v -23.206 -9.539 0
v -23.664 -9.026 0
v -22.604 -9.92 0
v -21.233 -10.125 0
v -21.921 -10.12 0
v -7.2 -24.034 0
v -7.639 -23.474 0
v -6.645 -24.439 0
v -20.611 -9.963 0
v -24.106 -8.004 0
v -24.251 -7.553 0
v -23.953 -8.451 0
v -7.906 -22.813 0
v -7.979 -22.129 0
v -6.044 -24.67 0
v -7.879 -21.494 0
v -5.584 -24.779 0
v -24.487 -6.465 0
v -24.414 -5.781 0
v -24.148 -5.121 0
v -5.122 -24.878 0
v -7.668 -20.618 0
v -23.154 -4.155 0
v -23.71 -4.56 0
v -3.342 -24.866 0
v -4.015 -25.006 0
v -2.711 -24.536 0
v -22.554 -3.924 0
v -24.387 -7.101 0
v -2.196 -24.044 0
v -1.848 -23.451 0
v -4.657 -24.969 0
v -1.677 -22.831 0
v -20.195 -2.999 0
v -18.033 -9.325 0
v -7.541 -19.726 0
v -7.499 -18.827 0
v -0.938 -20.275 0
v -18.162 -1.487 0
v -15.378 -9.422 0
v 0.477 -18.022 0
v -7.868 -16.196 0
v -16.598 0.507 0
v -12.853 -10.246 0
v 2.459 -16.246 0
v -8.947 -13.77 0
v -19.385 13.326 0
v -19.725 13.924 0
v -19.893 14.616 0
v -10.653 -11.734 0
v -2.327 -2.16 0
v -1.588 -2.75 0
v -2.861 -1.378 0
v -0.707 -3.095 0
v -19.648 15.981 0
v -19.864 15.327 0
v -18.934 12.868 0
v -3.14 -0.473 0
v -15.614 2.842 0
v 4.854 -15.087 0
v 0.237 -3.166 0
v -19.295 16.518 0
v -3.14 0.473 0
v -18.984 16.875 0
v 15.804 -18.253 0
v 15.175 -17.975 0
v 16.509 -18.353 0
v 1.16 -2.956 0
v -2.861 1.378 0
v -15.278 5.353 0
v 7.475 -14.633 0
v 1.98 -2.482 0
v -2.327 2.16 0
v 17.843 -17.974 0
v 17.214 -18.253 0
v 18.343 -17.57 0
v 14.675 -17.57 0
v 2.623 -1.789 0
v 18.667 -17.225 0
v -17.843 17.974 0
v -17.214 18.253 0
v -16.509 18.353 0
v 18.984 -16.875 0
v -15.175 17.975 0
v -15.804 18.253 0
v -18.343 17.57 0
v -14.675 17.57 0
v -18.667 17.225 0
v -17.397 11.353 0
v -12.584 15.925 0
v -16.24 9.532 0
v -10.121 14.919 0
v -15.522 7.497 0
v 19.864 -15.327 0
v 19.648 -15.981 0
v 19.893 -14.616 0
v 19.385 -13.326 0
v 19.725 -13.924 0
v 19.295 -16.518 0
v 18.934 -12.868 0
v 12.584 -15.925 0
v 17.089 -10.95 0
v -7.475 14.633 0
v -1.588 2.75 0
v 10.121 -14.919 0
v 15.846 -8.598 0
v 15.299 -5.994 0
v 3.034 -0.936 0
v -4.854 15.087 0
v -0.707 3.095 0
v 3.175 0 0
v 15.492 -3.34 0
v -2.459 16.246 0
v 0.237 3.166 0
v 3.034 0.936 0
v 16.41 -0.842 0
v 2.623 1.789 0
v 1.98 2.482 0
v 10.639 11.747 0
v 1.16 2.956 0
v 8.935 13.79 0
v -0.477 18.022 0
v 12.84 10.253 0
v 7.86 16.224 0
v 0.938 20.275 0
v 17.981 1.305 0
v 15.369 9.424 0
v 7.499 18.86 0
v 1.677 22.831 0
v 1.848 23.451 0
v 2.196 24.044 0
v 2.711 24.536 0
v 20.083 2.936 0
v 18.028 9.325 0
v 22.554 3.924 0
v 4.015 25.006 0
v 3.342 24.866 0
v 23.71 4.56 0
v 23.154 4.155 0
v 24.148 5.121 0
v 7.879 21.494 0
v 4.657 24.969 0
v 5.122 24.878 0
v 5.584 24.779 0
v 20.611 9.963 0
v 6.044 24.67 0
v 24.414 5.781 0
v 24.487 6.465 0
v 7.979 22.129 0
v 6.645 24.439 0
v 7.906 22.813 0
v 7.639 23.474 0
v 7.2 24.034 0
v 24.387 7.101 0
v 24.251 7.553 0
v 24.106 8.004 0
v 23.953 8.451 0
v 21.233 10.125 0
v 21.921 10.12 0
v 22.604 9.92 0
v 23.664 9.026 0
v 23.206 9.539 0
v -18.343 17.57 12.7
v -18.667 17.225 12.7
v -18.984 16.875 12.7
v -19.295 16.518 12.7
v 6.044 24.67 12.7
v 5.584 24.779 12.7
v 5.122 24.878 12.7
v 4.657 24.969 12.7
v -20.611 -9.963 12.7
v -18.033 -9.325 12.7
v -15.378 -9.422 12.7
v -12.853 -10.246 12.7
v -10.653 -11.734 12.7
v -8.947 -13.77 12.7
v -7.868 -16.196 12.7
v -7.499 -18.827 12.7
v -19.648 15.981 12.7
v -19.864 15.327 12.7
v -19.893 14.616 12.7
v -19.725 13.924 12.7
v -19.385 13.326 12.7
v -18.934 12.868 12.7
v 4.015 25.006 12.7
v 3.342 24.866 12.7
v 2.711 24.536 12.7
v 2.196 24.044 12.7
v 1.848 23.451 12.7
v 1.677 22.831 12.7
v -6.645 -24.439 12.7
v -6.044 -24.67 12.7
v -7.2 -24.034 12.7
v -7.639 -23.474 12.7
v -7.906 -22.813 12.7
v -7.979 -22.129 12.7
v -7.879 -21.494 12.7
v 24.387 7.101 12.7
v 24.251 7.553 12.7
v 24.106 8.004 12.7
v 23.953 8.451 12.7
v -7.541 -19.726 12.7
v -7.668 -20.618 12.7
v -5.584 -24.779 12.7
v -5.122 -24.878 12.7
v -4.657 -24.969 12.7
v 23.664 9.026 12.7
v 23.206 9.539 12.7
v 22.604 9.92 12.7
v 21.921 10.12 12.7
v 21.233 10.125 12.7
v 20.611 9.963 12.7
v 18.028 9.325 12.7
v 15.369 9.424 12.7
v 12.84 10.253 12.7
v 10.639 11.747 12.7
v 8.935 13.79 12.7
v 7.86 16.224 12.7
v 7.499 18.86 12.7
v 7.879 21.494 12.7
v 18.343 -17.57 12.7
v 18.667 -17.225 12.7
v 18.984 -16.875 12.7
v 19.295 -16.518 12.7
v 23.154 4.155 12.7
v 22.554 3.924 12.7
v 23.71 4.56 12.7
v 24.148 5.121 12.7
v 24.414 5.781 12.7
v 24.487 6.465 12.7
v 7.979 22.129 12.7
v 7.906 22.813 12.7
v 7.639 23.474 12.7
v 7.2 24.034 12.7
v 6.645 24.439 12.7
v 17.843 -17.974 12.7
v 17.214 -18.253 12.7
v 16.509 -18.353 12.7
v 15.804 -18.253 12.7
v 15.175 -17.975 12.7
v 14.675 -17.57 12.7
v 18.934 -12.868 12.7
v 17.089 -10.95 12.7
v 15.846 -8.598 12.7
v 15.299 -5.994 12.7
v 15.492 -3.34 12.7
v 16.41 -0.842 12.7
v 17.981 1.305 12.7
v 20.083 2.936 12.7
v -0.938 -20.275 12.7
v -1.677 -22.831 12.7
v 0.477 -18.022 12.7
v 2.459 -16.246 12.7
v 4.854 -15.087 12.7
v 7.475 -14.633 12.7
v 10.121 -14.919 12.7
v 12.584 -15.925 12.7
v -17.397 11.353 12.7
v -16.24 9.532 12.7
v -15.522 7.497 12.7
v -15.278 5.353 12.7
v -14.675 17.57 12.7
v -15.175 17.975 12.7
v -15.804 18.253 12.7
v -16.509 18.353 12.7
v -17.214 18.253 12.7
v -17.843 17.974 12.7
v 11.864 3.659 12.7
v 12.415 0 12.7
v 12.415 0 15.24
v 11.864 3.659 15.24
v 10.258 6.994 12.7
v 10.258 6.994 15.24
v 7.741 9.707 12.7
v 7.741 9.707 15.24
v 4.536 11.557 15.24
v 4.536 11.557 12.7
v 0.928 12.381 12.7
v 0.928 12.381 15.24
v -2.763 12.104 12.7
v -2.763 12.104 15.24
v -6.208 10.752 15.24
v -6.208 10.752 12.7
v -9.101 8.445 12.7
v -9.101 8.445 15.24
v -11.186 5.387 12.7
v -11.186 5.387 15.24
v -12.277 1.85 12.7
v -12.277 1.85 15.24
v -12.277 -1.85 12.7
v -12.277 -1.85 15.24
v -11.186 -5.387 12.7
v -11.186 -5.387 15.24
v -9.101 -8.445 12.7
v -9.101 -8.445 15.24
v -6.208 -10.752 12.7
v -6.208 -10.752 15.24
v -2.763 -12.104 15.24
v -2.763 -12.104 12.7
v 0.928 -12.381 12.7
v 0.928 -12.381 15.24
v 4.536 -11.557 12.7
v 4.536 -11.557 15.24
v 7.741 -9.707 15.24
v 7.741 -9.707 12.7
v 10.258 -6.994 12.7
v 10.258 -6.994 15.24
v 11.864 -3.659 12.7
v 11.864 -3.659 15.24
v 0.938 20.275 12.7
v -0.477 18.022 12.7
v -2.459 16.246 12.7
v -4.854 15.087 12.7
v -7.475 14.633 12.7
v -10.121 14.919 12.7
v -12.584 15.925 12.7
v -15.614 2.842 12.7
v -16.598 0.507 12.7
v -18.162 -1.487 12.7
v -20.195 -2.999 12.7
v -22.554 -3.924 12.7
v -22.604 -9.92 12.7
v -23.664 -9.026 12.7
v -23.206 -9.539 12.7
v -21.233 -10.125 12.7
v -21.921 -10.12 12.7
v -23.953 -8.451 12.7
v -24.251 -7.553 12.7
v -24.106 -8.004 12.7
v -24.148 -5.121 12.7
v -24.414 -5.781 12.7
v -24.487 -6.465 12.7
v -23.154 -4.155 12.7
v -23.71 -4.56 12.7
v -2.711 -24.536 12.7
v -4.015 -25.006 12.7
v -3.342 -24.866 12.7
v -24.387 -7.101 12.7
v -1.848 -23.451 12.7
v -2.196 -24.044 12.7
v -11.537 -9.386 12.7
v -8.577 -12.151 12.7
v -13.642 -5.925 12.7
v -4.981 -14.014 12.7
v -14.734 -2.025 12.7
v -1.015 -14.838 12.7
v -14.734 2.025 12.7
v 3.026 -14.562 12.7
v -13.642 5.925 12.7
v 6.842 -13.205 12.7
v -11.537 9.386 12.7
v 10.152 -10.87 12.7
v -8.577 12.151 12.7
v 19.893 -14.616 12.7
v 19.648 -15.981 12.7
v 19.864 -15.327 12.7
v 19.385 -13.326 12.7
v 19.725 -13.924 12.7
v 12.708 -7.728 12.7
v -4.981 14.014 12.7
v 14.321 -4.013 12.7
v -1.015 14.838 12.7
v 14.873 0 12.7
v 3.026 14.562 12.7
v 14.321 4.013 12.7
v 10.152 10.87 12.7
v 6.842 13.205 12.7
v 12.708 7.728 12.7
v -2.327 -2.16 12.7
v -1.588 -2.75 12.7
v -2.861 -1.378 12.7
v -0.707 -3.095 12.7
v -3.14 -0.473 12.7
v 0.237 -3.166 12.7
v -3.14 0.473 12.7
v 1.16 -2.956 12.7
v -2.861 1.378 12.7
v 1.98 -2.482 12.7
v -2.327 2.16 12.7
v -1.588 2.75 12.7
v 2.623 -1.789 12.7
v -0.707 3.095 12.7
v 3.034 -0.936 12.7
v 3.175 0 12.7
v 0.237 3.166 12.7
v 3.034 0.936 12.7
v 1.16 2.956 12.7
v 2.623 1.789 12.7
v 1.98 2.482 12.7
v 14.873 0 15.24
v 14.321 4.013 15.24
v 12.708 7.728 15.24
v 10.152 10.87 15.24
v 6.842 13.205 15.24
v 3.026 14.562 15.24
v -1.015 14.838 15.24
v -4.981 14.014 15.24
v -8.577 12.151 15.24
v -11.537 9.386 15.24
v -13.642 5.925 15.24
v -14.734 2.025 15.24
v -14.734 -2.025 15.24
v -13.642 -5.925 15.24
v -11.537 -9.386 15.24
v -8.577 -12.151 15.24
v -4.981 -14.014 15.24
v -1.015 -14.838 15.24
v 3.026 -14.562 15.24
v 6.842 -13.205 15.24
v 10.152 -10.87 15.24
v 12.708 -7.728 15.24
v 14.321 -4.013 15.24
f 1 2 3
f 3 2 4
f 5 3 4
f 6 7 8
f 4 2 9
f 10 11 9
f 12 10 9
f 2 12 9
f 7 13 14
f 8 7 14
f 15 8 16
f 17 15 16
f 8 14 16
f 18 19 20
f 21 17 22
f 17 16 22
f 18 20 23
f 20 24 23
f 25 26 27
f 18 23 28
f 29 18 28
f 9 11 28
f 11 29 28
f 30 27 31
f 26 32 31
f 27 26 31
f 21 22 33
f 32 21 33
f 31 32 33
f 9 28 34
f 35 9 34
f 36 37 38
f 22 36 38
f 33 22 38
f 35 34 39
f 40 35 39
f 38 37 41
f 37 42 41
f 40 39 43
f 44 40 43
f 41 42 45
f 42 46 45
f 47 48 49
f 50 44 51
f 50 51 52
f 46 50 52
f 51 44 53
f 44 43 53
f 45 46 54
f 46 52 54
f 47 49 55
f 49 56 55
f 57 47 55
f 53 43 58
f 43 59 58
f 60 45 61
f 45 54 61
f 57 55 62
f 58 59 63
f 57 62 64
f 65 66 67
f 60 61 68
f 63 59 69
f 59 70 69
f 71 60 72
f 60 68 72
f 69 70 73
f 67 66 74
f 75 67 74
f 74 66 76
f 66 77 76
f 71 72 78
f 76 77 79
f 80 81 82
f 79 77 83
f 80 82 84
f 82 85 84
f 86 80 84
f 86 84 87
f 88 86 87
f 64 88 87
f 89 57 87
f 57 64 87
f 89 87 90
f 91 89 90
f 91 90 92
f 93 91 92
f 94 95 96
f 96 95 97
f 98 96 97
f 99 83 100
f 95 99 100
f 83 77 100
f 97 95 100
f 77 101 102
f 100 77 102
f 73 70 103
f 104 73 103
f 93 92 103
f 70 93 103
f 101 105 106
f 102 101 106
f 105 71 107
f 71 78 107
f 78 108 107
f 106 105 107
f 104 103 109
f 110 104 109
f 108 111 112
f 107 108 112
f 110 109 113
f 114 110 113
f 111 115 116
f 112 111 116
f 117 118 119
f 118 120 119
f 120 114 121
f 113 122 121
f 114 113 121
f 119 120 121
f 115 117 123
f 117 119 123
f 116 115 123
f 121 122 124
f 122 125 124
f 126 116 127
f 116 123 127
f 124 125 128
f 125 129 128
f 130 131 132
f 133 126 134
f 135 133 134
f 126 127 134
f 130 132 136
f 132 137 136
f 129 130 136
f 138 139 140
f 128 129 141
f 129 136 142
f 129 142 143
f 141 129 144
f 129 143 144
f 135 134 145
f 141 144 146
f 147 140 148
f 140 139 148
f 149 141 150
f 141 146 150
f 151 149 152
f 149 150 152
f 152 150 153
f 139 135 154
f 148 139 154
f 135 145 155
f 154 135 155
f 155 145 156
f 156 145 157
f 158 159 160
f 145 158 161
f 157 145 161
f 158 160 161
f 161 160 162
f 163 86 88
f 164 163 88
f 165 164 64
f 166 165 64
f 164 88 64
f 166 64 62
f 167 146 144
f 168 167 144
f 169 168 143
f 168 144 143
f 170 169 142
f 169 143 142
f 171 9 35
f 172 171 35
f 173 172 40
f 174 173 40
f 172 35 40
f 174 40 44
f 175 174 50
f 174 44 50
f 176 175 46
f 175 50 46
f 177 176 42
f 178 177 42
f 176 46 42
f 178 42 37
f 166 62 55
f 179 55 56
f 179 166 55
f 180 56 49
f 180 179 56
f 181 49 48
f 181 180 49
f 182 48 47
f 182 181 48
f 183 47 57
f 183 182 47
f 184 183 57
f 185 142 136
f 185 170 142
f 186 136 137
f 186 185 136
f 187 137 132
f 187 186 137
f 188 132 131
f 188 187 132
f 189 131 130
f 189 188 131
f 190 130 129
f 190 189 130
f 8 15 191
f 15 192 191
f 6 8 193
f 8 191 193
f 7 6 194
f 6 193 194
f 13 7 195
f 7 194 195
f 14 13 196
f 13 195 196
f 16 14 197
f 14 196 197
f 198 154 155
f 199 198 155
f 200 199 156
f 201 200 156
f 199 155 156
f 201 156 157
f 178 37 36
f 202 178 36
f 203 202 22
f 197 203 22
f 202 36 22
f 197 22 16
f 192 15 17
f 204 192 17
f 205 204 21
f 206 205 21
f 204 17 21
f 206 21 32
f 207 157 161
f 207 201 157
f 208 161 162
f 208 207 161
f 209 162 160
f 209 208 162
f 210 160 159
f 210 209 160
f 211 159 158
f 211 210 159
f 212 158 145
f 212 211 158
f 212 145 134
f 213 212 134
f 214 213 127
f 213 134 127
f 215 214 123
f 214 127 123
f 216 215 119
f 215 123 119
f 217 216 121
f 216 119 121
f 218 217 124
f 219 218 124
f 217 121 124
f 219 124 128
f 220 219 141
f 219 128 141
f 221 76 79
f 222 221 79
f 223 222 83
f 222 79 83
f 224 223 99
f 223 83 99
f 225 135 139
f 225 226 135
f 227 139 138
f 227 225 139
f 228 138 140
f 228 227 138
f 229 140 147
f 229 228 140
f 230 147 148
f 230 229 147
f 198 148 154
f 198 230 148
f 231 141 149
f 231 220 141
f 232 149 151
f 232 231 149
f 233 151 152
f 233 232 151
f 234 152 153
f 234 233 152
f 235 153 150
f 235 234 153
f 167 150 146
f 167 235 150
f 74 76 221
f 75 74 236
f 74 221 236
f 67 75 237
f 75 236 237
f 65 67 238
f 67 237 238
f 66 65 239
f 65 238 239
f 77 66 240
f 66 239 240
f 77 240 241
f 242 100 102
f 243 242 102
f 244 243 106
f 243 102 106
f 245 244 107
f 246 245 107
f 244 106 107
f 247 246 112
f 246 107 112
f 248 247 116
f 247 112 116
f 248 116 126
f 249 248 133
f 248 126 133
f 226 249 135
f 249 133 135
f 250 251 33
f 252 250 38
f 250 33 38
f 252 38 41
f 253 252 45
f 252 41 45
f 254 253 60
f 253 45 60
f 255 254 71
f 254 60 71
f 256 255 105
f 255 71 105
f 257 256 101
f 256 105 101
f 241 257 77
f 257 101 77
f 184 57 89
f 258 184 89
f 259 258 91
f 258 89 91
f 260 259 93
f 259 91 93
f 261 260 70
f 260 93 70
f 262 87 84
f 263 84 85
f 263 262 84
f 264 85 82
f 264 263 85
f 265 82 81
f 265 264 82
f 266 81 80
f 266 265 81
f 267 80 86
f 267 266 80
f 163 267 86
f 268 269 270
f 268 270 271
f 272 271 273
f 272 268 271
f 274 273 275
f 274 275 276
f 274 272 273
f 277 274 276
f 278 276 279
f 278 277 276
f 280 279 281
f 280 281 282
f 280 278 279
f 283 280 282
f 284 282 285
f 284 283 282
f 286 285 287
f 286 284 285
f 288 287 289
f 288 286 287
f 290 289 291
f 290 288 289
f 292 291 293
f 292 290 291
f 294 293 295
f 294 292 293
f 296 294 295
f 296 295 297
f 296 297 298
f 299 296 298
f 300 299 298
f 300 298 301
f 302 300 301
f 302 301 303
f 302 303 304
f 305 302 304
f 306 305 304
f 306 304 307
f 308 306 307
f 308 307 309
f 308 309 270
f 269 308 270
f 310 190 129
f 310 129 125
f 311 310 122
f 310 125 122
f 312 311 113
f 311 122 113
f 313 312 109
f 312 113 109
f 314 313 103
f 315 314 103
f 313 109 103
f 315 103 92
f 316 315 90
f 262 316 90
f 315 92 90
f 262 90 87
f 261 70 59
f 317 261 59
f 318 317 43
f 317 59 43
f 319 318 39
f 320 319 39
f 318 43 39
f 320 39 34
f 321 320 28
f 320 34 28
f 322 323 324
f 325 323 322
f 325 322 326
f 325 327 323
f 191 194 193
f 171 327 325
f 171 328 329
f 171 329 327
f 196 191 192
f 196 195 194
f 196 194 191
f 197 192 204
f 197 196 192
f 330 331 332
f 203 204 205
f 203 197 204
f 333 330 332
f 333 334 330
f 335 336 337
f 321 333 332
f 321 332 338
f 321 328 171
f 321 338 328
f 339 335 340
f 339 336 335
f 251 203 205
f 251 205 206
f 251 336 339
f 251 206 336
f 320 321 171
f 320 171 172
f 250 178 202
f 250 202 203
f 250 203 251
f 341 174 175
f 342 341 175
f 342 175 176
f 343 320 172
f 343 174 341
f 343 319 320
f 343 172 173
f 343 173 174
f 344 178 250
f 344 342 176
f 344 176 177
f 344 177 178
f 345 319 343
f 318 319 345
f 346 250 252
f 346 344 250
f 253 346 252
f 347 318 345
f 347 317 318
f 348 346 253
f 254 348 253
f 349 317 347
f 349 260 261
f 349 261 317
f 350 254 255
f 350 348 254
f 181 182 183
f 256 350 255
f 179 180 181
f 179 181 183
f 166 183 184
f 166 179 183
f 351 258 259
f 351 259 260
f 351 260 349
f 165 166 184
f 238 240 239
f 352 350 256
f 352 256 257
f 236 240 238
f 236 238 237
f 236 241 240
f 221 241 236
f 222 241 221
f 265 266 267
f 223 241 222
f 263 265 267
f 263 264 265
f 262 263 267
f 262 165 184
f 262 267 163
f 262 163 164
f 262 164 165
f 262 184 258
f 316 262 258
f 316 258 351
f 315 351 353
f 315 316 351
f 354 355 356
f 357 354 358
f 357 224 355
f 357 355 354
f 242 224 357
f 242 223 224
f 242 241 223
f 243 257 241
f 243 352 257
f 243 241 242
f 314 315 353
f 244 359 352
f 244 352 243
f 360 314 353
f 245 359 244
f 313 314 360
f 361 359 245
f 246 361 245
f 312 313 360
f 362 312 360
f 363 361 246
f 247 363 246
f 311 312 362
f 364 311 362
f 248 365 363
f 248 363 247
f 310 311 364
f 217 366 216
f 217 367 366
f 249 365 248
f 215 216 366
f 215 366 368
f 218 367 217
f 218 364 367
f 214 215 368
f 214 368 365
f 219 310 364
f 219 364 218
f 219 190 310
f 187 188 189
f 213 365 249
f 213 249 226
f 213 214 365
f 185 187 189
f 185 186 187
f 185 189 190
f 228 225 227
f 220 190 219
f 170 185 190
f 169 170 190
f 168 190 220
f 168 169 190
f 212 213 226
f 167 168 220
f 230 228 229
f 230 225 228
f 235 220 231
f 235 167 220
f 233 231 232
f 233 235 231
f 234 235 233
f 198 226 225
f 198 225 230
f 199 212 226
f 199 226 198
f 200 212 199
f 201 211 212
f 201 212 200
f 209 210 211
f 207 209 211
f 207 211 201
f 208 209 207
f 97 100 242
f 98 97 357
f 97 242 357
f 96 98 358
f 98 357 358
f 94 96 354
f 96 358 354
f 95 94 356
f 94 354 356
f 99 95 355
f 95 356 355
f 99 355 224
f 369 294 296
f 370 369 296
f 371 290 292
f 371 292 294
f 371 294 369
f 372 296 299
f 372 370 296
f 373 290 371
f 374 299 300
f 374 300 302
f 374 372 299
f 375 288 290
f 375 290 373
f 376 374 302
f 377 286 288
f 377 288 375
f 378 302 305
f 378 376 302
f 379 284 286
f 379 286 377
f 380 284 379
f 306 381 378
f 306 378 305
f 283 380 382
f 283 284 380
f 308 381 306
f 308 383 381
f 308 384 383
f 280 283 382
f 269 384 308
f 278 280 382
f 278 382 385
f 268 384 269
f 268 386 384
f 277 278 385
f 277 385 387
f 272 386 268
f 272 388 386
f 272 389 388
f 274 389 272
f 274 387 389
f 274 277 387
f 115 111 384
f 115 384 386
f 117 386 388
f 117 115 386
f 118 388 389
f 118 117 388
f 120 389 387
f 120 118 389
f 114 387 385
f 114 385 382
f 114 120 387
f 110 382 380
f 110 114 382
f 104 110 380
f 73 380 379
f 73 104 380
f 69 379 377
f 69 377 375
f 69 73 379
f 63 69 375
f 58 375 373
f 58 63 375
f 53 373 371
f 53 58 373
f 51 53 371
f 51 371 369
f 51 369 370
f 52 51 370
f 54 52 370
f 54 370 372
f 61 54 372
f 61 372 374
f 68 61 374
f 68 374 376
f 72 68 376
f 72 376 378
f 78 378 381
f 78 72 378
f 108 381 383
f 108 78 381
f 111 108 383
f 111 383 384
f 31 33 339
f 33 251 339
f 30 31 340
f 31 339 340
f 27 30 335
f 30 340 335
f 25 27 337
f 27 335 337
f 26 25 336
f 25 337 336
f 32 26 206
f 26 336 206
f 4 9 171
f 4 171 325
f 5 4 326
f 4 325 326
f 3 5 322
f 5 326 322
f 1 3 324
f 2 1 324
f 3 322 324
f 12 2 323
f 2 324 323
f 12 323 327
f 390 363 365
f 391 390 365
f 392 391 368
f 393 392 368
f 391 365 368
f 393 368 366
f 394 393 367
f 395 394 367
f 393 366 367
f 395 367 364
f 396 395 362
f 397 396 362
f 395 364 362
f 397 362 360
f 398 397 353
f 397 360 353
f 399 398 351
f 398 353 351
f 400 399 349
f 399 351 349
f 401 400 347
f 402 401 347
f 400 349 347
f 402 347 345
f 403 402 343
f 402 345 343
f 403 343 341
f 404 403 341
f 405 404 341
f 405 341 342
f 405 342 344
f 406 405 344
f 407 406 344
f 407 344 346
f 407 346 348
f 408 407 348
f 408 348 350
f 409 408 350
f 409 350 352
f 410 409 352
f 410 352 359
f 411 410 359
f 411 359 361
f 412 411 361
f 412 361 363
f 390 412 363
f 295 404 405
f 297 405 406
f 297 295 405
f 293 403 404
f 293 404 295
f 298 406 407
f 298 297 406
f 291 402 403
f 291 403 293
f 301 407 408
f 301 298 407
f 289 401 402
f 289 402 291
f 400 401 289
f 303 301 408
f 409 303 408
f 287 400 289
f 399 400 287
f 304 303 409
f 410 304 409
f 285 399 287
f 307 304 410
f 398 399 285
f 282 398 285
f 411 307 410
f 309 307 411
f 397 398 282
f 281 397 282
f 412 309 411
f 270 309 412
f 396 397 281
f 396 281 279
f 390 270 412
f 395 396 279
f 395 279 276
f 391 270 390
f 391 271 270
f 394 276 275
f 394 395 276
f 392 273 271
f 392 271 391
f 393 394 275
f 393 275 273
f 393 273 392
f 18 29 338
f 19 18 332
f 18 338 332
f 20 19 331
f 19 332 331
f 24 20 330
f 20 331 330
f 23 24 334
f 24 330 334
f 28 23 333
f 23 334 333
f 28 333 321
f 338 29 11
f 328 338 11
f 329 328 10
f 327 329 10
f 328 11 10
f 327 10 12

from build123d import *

# Parameters (mm, degrees)
F0_R     = 14.8728461467
F1_DEPTH = 12.7
F2_R     = 2.54
F0_R_2   = 12.4153453857
F0_R_3   = 3.175
F3_DEPTH = 12.7
F4_DEPTH = 15.24


with BuildPart() as f1:
    # F0 (on Top) → F1 (new body)
    with BuildSketch(Plane.XY):
        with BuildLine():
            ThreePointArc((21.0967877354, -14.1451598523), (15.4923273366, -3.3399893418), (25.0509920661, 4.1961644989))
            ThreePointArc((25.0509920661, 4.1961644989), (24.1794993656, 7.778933759), (22.7984616404, 11.197774191))
            ThreePointArc((22.7984616404, 11.197774191), (10.6386792866, 11.7467543663), (8.8915109785, 23.7928777688))
            ThreePointArc((8.8915109785, 23.7928777688), (5.3529954332, 24.8295275809), (1.7016739049, 25.3429340433))
            ThreePointArc((1.7016739049, 25.3429340433), (1.7549973478, 24.7623025716), (1.7727939343, 24.1794993656))
            ThreePointArc((1.7727939343, 24.1794993656), (-5.4138971923, 14.9251974489), (-16.1594810876, 19.5967132698))
            ThreePointArc((-16.1594810876, 19.5967132698), (-18.8265039325, 17.0505938219), (-21.0967877354, 14.1451598523))
            ThreePointArc((-21.0967877354, 14.1451598523), (-16.8643026475, 10.6246833684), (-15.2777998876, 5.3529954332))
            ThreePointArc((-15.2777998876, 5.3529954332), (-18.154194875, -1.4789468377), (-25.0509920661, -4.1961644989))
            ThreePointArc((-25.0509920661, -4.1961644989), (-24.1794993656, -7.778933759), (-22.7984616404, -11.197774191))
            ThreePointArc((-22.7984616404, -11.197774191), (-12.7883506503, -10.278475793), (-7.4988661286, -18.8265039325))
            ThreePointArc((-7.4988661286, -18.8265039325), (-7.8536149844, -21.4054731432), (-8.8915109785, -23.7928777688))
            ThreePointArc((-8.8915109785, -23.7928777688), (-5.3529954332, -24.8295275809), (-1.7016739049, -25.3429340433))
            ThreePointArc((-1.7016739049, -25.3429340433), (4.8536480499, -15.0867437081), (16.1594810876, -19.5967132698))
            ThreePointArc((16.1594810876, -19.5967132698), (18.8265039325, -17.0505938219), (21.0967877354, -14.1451598523))
        make_face()
        Circle(F0_R, mode=Mode.SUBTRACT)
    extrude(amount=F1_DEPTH)

    # F2
    f2_edges = [f1.edges().sort_by_distance(p)[0] for p in [
        (1.701674, 25.342934, 6.35),
        (8.891511, 23.792878, 6.35),
        (-16.159481, 19.596713, 6.35),
        (-21.096788, 14.14516, 6.35),
        (-25.050992, -4.196164, 6.35),
        (25.050992, 4.196164, 6.35),
        (22.798462, 11.197774, 6.35),
        (21.096788, -14.14516, 6.35),
        (16.159481, -19.596713, 6.35),
        (-1.701674, -25.342934, 6.35),
        (-8.891511, -23.792878, 6.35),
        (-22.798462, -11.197774, 6.35),
    ]]
    fillet(f2_edges, radius=F2_R)



with BuildPart() as f3:
    # F0 (on Top) → F3 (new body)
    with BuildSketch(Plane.XY):
        Circle(F0_R_2)
        Circle(F0_R_3, mode=Mode.SUBTRACT)
    extrude(amount=F3_DEPTH)


with BuildPart() as f1_1:
    add(f1.part)

    add(f3.part)  # F4 merges F3
    # F0 (on Top) → F4 (join)
    with BuildSketch(Plane.XY):
        Circle(F0_R)
        Circle(F0_R_2, mode=Mode.SUBTRACT)
    extrude(amount=F4_DEPTH)


solid = f1_1.part
